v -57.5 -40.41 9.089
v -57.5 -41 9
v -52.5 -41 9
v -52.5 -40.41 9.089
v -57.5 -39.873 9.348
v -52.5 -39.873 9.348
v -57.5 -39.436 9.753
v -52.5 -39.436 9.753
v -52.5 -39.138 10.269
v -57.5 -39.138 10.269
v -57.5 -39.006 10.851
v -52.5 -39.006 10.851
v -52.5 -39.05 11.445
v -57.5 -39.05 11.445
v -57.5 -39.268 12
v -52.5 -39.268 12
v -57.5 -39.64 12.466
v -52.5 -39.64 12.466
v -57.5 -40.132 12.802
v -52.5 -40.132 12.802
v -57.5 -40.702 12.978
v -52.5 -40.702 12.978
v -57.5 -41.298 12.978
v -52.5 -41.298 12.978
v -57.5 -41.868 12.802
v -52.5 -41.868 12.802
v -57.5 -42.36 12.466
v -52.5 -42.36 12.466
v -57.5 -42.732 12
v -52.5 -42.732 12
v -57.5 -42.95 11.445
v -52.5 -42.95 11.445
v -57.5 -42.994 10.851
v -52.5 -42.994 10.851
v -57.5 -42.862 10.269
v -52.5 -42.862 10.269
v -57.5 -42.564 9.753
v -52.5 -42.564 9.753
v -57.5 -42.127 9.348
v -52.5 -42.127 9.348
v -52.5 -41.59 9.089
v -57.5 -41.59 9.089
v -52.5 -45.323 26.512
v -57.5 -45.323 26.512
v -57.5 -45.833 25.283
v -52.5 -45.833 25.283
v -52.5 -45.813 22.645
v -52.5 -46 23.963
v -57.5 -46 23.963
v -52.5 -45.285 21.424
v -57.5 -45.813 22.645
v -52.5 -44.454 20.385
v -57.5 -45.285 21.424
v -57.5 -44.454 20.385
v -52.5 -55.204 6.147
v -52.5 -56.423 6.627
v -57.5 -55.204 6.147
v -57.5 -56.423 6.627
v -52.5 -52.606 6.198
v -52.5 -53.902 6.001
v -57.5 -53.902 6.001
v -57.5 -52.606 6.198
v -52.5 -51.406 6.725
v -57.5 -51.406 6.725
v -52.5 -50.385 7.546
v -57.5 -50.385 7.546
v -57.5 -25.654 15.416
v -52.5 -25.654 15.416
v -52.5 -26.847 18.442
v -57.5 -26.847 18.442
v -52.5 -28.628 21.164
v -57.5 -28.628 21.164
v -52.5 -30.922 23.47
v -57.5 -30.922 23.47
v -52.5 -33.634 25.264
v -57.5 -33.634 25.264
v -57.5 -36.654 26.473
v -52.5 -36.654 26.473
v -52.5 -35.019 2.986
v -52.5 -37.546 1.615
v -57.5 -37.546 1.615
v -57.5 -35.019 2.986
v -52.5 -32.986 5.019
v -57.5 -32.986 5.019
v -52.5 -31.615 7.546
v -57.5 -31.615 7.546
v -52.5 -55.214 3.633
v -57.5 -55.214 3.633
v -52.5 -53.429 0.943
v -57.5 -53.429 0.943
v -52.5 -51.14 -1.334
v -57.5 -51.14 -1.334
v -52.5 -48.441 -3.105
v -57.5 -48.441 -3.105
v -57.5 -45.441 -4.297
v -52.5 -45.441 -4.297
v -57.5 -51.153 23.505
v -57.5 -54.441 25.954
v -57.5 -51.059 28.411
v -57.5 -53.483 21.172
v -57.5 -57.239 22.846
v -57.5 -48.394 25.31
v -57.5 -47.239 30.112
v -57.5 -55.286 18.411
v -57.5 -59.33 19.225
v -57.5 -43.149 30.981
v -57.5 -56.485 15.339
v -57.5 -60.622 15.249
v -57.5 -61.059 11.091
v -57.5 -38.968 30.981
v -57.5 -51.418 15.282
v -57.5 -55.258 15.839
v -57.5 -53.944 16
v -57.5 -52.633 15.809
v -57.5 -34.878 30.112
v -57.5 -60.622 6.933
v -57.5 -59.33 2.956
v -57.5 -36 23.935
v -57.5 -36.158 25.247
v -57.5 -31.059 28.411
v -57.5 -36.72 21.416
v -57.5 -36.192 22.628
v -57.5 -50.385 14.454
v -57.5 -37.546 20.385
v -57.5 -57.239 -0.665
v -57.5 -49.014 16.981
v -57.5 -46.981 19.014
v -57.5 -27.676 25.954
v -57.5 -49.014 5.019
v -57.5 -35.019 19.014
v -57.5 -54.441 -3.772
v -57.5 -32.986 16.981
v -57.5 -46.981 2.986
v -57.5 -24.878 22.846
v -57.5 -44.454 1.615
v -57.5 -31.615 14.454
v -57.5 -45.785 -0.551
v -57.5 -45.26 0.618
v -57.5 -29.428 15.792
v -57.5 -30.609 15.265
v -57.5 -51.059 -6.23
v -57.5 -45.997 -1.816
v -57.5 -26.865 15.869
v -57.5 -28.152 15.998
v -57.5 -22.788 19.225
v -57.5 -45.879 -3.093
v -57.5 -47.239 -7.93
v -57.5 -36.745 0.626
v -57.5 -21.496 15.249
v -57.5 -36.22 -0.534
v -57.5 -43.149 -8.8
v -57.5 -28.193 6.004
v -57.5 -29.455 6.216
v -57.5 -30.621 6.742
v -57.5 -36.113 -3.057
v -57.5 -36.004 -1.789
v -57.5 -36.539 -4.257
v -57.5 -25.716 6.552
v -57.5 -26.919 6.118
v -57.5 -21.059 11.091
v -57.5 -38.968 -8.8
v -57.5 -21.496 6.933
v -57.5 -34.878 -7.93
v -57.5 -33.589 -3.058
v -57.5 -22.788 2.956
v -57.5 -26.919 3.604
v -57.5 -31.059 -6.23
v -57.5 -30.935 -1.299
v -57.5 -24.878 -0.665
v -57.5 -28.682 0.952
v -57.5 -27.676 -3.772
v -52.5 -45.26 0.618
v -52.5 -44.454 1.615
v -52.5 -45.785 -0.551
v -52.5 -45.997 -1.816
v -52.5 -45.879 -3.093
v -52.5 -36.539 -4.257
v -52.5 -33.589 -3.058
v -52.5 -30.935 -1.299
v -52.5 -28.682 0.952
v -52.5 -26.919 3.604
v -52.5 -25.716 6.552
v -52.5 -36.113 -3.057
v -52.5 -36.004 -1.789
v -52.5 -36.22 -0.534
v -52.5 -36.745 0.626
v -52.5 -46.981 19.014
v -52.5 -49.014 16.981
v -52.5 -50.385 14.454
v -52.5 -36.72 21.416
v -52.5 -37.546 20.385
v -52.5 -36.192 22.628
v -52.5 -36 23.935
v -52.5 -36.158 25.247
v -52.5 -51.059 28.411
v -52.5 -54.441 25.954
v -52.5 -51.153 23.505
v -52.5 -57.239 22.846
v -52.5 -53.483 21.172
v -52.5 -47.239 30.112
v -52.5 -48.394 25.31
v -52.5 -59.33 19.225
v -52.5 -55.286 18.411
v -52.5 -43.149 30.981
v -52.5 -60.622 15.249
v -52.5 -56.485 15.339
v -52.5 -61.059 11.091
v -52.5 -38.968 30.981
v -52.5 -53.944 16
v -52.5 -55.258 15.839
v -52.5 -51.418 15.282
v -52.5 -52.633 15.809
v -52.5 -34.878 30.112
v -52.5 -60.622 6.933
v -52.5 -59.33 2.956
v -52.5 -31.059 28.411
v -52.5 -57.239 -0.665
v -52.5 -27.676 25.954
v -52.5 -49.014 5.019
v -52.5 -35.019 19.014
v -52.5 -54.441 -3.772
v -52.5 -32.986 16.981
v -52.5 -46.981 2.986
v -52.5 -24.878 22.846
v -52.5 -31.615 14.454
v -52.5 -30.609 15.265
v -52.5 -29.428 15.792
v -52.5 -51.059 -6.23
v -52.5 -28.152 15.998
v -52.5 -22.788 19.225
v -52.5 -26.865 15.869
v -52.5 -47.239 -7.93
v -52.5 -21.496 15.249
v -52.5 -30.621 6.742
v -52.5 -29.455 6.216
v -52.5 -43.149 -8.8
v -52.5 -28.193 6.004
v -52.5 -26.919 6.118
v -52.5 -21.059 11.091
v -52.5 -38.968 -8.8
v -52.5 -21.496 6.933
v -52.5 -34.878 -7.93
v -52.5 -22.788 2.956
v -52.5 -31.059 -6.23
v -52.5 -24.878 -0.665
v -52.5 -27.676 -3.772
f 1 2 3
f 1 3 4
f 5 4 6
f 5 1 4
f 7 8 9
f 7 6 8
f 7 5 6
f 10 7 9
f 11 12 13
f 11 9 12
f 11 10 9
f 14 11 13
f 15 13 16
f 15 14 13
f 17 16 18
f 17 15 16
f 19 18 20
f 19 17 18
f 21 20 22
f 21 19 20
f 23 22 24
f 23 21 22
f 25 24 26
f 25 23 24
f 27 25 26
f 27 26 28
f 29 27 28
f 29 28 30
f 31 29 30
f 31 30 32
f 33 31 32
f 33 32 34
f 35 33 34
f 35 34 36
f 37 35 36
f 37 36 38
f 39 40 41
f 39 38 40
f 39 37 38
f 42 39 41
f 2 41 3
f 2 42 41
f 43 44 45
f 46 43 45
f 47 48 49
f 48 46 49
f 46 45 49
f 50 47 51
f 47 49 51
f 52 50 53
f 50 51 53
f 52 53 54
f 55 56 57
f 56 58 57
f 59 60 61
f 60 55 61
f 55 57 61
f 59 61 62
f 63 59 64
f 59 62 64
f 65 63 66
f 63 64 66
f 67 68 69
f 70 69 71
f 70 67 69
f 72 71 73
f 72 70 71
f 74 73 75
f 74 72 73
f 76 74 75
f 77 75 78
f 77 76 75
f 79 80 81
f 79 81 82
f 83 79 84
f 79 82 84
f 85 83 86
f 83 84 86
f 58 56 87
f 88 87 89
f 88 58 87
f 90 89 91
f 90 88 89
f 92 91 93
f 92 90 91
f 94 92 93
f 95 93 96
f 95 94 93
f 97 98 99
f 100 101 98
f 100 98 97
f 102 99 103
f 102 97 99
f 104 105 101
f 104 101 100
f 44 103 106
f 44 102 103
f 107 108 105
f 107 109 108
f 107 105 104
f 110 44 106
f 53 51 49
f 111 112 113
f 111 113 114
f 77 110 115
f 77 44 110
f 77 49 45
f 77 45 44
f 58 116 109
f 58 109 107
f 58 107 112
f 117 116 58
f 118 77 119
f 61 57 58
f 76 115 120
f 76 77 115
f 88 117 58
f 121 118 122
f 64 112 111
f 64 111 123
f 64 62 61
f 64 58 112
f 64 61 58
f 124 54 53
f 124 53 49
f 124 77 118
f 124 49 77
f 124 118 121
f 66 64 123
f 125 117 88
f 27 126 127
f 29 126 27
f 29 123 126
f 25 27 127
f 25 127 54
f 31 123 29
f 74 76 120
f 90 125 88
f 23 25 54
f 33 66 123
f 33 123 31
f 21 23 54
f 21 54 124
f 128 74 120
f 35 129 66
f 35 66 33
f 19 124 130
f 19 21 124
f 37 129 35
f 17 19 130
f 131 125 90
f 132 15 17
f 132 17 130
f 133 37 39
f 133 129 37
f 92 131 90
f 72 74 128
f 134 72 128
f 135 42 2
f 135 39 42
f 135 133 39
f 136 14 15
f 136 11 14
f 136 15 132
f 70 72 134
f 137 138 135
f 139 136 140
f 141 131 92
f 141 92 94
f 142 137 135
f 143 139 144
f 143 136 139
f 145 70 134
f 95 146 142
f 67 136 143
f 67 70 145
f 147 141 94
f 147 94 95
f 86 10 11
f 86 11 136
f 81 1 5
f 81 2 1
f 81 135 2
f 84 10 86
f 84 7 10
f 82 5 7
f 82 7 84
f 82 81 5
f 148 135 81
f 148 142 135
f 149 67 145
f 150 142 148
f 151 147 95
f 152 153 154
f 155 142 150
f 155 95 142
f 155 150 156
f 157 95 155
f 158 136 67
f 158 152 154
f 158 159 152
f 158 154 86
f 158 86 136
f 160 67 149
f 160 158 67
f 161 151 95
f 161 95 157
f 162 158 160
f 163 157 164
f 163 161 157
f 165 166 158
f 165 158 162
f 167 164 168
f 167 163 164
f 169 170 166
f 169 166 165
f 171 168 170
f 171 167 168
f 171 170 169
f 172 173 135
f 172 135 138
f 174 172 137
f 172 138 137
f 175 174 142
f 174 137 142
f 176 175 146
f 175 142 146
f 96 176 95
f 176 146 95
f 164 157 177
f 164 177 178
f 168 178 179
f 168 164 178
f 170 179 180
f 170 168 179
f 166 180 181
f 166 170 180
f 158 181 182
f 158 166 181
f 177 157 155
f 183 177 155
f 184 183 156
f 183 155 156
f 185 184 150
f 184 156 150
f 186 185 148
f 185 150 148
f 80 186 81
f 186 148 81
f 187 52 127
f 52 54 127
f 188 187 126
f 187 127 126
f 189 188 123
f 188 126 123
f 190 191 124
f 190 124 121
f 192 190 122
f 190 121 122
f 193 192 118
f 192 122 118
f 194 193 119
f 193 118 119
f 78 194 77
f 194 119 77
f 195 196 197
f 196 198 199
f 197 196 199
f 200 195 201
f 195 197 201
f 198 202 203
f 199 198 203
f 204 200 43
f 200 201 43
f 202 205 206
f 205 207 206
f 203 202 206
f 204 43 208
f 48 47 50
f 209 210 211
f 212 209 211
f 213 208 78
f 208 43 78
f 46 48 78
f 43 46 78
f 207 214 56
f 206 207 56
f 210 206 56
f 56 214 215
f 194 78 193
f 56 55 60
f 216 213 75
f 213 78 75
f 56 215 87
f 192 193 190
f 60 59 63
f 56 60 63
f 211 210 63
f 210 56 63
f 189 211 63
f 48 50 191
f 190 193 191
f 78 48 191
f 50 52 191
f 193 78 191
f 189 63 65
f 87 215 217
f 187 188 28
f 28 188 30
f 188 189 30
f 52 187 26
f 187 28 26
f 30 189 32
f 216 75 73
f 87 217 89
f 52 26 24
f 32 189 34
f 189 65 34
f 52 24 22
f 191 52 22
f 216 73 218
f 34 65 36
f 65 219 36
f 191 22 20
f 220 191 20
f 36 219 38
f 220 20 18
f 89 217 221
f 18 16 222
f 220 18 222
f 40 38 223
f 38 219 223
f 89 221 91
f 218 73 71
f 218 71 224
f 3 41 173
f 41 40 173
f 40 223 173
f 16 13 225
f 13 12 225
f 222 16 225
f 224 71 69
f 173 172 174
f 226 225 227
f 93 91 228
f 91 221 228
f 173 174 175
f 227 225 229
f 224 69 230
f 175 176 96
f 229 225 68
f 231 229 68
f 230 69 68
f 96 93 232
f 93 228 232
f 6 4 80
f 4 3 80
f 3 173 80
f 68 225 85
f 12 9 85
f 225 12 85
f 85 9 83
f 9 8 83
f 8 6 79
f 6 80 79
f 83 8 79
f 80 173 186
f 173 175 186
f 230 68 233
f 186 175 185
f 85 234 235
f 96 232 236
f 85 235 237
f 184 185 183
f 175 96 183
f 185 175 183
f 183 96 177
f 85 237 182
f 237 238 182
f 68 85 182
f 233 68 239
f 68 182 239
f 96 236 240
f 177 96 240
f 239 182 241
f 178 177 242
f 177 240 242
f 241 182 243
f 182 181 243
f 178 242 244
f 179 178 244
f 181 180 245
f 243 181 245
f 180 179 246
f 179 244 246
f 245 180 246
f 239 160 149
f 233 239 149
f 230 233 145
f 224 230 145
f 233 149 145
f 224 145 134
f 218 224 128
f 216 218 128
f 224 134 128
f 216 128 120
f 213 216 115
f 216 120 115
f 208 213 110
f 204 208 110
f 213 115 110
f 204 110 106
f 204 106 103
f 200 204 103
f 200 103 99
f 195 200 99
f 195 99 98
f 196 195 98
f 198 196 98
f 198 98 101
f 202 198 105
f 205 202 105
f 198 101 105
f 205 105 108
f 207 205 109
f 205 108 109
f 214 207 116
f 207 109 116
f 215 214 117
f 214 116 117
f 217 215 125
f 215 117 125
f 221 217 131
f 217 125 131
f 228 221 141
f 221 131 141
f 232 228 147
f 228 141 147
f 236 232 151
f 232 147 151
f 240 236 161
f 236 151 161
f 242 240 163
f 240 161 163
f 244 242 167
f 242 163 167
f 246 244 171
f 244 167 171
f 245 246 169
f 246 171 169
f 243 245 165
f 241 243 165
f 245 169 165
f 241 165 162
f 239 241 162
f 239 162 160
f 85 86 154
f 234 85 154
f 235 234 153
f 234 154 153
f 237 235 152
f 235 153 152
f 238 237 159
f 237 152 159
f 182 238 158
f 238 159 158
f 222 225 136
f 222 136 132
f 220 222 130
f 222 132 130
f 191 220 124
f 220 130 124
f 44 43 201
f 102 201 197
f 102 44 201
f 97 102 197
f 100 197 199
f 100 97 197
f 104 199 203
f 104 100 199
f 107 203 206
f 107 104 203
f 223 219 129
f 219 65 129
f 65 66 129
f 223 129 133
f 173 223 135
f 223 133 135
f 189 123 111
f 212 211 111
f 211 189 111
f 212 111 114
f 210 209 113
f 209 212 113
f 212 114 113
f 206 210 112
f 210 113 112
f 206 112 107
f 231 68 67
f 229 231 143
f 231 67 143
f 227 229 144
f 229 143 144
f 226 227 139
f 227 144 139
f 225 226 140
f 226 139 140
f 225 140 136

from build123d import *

# Parameters (mm, degrees)
BOX006_W                = 10
BOX006_H                = 45
BOX006_DEPTH            = 45
BOX004_W                = 10
BOX004_H                = 45
BOX004_DEPTH            = 45
CYLINDER012_R           = 5
CYLINDER012_DEPTH       = 10
CYLINDER012_PITCH_ANGLE = 90
SKETCH005_R             = 20
SKETCH005_R_2           = 16
PAD010_DEPTH            = 5
CYLINDER014_R           = 5
CYLINDER014_DEPTH       = 10
CYLINDER014_PITCH_ANGLE = 90
CYLINDER016_R           = 5
CYLINDER016_DEPTH       = 10
CYLINDER016_PITCH_ANGLE = 90
CYLINDER015_R           = 5
CYLINDER015_DEPTH       = 10
CYLINDER015_PITCH_ANGLE = 90
CYLINDER013_R           = 2
CYLINDER013_DEPTH       = 30
CYLINDER013_PITCH_ANGLE = 90
CYLINDER017_R           = 10
CYLINDER017_DEPTH       = 10
CYLINDER017_PITCH_ANGLE = 90


with BuildPart() as cube006:
    # Box006 → Box006 (new body)
    with BuildSketch(Plane(origin=(-10, -54, -57), x_dir=(1, 0, 0), z_dir=(0, 0, 1))):
        with Locations((5, 22.5)):
            Rectangle(BOX006_W, BOX006_H)
    extrude(amount=BOX006_DEPTH)


with BuildPart() as cube004:
    # Box004 → Box004 (new body)
    with BuildSketch(Plane(origin=(5, -54, -57), x_dir=(1, 0, 0), z_dir=(0, 0, 1))):
        with Locations((5, 22.5)):
            Rectangle(BOX004_W, BOX004_H)
    extrude(amount=BOX004_DEPTH)


with BuildPart() as cylinder:
    # Cylinder012 → Cylinder012 (new body)
    with BuildSketch(Plane.XY):
        Circle(CYLINDER012_R)
    extrude(amount=CYLINDER012_DEPTH)


with BuildPart() as cylinder_1:
    # Cylinder012 pitch: moved
    add(cylinder.part.rotate(Axis((0, 0, 0), (0, 1, 0)), CYLINDER012_PITCH_ANGLE))


with BuildPart() as cylinder_2:
    # Cylinder012 placement: moved
    add(cylinder_1.part.moved(Location((-2, -30.5, -21.5))))


with BuildPart() as fusion012:
    # Sketch005 → Pad010 (new body)
    with BuildSketch(Plane.YZ):
        with Locations((-30.558836, -34.409251)):
            Circle(SKETCH005_R)
        with Locations((-30.558836, -34.409251)):
            Circle(SKETCH005_R_2, mode=Mode.SUBTRACT)
    extrude(amount=PAD010_DEPTH)

    # Fusion012: union Cylinder
    add(cylinder_2.part)


with BuildPart() as fusion013:
    # Cylinder014 → Cylinder014 (new body)
    with BuildSketch(Plane.XY):
        Circle(CYLINDER014_R)
    extrude(amount=CYLINDER014_DEPTH)


with BuildPart() as fusion013_1:
    # Cylinder014 pitch: moved
    add(fusion013.part.rotate(Axis((0, 0, 0), (0, 1, 0)), CYLINDER014_PITCH_ANGLE))


with BuildPart() as fusion013_2:
    # Cylinder014 placement: moved
    add(fusion013_1.part.moved(Location((-2, -43.5, -34.5))))

    # Fusion013: union Fusion012
    add(fusion012.part)


with BuildPart() as fusion014:
    # Cylinder016 → Cylinder016 (new body)
    with BuildSketch(Plane.XY):
        Circle(CYLINDER016_R)
    extrude(amount=CYLINDER016_DEPTH)


with BuildPart() as fusion014_1:
    # Cylinder016 pitch: moved
    add(fusion014.part.rotate(Axis((0, 0, 0), (0, 1, 0)), CYLINDER016_PITCH_ANGLE))


with BuildPart() as fusion014_2:
    # Cylinder016 placement: moved
    add(fusion014_1.part.moved(Location((-2, -30.5, -47.5))))

    # Fusion014: union Fusion013
    add(fusion013_2.part)


with BuildPart() as fusion015:
    # Cylinder015 → Cylinder015 (new body)
    with BuildSketch(Plane.XY):
        Circle(CYLINDER015_R)
    extrude(amount=CYLINDER015_DEPTH)


with BuildPart() as fusion015_1:
    # Cylinder015 pitch: moved
    add(fusion015.part.rotate(Axis((0, 0, 0), (0, 1, 0)), CYLINDER015_PITCH_ANGLE))


with BuildPart() as fusion015_2:
    # Cylinder015 placement: moved
    add(fusion015_1.part.moved(Location((-3, -17.5, -34.5))))

    # Fusion015: union Fusion014
    add(fusion014_2.part)


with BuildPart() as cylinder011:
    # Cylinder013 → Cylinder013 (new body)
    with BuildSketch(Plane.XY):
        Circle(CYLINDER013_R)
    extrude(amount=CYLINDER013_DEPTH)


with BuildPart() as cylinder011_1:
    # Cylinder013 pitch: moved
    add(cylinder011.part.rotate(Axis((0, 0, 0), (0, 1, 0)), CYLINDER013_PITCH_ANGLE))


with BuildPart() as cylinder011_2:
    # Cylinder013 placement: moved
    add(cylinder011_1.part.moved(Location((-12, -30.5, -34.5))))


with BuildPart() as cut009:
    # Cylinder017 → Cylinder017 (new body)
    with BuildSketch(Plane.XY):
        Circle(CYLINDER017_R)
    extrude(amount=CYLINDER017_DEPTH)


with BuildPart() as cut009_1:
    # Cylinder017 pitch: moved
    add(cut009.part.rotate(Axis((0, 0, 0), (0, 1, 0)), CYLINDER017_PITCH_ANGLE))


with BuildPart() as cut009_2:
    # Cylinder017 placement: moved
    add(cut009_1.part.moved(Location((-2, -30.5, -34.5))))

    # Cut006: cut Cylinder011
    add(cylinder011_2.part, mode=Mode.SUBTRACT)

    # Fusion016: union Fusion015
    add(fusion015_2.part)

    # Cut010: cut Cube004
    add(cube004.part, mode=Mode.SUBTRACT)

    # Cut009: cut Cube006
    add(cube006.part, mode=Mode.SUBTRACT)


with BuildPart() as cut009_3:
    # Cut009 placement: moved
    add(cut009_2.part.moved(Location((-57.5, -10.5, 45.5))))


solid = cut009_3.part
